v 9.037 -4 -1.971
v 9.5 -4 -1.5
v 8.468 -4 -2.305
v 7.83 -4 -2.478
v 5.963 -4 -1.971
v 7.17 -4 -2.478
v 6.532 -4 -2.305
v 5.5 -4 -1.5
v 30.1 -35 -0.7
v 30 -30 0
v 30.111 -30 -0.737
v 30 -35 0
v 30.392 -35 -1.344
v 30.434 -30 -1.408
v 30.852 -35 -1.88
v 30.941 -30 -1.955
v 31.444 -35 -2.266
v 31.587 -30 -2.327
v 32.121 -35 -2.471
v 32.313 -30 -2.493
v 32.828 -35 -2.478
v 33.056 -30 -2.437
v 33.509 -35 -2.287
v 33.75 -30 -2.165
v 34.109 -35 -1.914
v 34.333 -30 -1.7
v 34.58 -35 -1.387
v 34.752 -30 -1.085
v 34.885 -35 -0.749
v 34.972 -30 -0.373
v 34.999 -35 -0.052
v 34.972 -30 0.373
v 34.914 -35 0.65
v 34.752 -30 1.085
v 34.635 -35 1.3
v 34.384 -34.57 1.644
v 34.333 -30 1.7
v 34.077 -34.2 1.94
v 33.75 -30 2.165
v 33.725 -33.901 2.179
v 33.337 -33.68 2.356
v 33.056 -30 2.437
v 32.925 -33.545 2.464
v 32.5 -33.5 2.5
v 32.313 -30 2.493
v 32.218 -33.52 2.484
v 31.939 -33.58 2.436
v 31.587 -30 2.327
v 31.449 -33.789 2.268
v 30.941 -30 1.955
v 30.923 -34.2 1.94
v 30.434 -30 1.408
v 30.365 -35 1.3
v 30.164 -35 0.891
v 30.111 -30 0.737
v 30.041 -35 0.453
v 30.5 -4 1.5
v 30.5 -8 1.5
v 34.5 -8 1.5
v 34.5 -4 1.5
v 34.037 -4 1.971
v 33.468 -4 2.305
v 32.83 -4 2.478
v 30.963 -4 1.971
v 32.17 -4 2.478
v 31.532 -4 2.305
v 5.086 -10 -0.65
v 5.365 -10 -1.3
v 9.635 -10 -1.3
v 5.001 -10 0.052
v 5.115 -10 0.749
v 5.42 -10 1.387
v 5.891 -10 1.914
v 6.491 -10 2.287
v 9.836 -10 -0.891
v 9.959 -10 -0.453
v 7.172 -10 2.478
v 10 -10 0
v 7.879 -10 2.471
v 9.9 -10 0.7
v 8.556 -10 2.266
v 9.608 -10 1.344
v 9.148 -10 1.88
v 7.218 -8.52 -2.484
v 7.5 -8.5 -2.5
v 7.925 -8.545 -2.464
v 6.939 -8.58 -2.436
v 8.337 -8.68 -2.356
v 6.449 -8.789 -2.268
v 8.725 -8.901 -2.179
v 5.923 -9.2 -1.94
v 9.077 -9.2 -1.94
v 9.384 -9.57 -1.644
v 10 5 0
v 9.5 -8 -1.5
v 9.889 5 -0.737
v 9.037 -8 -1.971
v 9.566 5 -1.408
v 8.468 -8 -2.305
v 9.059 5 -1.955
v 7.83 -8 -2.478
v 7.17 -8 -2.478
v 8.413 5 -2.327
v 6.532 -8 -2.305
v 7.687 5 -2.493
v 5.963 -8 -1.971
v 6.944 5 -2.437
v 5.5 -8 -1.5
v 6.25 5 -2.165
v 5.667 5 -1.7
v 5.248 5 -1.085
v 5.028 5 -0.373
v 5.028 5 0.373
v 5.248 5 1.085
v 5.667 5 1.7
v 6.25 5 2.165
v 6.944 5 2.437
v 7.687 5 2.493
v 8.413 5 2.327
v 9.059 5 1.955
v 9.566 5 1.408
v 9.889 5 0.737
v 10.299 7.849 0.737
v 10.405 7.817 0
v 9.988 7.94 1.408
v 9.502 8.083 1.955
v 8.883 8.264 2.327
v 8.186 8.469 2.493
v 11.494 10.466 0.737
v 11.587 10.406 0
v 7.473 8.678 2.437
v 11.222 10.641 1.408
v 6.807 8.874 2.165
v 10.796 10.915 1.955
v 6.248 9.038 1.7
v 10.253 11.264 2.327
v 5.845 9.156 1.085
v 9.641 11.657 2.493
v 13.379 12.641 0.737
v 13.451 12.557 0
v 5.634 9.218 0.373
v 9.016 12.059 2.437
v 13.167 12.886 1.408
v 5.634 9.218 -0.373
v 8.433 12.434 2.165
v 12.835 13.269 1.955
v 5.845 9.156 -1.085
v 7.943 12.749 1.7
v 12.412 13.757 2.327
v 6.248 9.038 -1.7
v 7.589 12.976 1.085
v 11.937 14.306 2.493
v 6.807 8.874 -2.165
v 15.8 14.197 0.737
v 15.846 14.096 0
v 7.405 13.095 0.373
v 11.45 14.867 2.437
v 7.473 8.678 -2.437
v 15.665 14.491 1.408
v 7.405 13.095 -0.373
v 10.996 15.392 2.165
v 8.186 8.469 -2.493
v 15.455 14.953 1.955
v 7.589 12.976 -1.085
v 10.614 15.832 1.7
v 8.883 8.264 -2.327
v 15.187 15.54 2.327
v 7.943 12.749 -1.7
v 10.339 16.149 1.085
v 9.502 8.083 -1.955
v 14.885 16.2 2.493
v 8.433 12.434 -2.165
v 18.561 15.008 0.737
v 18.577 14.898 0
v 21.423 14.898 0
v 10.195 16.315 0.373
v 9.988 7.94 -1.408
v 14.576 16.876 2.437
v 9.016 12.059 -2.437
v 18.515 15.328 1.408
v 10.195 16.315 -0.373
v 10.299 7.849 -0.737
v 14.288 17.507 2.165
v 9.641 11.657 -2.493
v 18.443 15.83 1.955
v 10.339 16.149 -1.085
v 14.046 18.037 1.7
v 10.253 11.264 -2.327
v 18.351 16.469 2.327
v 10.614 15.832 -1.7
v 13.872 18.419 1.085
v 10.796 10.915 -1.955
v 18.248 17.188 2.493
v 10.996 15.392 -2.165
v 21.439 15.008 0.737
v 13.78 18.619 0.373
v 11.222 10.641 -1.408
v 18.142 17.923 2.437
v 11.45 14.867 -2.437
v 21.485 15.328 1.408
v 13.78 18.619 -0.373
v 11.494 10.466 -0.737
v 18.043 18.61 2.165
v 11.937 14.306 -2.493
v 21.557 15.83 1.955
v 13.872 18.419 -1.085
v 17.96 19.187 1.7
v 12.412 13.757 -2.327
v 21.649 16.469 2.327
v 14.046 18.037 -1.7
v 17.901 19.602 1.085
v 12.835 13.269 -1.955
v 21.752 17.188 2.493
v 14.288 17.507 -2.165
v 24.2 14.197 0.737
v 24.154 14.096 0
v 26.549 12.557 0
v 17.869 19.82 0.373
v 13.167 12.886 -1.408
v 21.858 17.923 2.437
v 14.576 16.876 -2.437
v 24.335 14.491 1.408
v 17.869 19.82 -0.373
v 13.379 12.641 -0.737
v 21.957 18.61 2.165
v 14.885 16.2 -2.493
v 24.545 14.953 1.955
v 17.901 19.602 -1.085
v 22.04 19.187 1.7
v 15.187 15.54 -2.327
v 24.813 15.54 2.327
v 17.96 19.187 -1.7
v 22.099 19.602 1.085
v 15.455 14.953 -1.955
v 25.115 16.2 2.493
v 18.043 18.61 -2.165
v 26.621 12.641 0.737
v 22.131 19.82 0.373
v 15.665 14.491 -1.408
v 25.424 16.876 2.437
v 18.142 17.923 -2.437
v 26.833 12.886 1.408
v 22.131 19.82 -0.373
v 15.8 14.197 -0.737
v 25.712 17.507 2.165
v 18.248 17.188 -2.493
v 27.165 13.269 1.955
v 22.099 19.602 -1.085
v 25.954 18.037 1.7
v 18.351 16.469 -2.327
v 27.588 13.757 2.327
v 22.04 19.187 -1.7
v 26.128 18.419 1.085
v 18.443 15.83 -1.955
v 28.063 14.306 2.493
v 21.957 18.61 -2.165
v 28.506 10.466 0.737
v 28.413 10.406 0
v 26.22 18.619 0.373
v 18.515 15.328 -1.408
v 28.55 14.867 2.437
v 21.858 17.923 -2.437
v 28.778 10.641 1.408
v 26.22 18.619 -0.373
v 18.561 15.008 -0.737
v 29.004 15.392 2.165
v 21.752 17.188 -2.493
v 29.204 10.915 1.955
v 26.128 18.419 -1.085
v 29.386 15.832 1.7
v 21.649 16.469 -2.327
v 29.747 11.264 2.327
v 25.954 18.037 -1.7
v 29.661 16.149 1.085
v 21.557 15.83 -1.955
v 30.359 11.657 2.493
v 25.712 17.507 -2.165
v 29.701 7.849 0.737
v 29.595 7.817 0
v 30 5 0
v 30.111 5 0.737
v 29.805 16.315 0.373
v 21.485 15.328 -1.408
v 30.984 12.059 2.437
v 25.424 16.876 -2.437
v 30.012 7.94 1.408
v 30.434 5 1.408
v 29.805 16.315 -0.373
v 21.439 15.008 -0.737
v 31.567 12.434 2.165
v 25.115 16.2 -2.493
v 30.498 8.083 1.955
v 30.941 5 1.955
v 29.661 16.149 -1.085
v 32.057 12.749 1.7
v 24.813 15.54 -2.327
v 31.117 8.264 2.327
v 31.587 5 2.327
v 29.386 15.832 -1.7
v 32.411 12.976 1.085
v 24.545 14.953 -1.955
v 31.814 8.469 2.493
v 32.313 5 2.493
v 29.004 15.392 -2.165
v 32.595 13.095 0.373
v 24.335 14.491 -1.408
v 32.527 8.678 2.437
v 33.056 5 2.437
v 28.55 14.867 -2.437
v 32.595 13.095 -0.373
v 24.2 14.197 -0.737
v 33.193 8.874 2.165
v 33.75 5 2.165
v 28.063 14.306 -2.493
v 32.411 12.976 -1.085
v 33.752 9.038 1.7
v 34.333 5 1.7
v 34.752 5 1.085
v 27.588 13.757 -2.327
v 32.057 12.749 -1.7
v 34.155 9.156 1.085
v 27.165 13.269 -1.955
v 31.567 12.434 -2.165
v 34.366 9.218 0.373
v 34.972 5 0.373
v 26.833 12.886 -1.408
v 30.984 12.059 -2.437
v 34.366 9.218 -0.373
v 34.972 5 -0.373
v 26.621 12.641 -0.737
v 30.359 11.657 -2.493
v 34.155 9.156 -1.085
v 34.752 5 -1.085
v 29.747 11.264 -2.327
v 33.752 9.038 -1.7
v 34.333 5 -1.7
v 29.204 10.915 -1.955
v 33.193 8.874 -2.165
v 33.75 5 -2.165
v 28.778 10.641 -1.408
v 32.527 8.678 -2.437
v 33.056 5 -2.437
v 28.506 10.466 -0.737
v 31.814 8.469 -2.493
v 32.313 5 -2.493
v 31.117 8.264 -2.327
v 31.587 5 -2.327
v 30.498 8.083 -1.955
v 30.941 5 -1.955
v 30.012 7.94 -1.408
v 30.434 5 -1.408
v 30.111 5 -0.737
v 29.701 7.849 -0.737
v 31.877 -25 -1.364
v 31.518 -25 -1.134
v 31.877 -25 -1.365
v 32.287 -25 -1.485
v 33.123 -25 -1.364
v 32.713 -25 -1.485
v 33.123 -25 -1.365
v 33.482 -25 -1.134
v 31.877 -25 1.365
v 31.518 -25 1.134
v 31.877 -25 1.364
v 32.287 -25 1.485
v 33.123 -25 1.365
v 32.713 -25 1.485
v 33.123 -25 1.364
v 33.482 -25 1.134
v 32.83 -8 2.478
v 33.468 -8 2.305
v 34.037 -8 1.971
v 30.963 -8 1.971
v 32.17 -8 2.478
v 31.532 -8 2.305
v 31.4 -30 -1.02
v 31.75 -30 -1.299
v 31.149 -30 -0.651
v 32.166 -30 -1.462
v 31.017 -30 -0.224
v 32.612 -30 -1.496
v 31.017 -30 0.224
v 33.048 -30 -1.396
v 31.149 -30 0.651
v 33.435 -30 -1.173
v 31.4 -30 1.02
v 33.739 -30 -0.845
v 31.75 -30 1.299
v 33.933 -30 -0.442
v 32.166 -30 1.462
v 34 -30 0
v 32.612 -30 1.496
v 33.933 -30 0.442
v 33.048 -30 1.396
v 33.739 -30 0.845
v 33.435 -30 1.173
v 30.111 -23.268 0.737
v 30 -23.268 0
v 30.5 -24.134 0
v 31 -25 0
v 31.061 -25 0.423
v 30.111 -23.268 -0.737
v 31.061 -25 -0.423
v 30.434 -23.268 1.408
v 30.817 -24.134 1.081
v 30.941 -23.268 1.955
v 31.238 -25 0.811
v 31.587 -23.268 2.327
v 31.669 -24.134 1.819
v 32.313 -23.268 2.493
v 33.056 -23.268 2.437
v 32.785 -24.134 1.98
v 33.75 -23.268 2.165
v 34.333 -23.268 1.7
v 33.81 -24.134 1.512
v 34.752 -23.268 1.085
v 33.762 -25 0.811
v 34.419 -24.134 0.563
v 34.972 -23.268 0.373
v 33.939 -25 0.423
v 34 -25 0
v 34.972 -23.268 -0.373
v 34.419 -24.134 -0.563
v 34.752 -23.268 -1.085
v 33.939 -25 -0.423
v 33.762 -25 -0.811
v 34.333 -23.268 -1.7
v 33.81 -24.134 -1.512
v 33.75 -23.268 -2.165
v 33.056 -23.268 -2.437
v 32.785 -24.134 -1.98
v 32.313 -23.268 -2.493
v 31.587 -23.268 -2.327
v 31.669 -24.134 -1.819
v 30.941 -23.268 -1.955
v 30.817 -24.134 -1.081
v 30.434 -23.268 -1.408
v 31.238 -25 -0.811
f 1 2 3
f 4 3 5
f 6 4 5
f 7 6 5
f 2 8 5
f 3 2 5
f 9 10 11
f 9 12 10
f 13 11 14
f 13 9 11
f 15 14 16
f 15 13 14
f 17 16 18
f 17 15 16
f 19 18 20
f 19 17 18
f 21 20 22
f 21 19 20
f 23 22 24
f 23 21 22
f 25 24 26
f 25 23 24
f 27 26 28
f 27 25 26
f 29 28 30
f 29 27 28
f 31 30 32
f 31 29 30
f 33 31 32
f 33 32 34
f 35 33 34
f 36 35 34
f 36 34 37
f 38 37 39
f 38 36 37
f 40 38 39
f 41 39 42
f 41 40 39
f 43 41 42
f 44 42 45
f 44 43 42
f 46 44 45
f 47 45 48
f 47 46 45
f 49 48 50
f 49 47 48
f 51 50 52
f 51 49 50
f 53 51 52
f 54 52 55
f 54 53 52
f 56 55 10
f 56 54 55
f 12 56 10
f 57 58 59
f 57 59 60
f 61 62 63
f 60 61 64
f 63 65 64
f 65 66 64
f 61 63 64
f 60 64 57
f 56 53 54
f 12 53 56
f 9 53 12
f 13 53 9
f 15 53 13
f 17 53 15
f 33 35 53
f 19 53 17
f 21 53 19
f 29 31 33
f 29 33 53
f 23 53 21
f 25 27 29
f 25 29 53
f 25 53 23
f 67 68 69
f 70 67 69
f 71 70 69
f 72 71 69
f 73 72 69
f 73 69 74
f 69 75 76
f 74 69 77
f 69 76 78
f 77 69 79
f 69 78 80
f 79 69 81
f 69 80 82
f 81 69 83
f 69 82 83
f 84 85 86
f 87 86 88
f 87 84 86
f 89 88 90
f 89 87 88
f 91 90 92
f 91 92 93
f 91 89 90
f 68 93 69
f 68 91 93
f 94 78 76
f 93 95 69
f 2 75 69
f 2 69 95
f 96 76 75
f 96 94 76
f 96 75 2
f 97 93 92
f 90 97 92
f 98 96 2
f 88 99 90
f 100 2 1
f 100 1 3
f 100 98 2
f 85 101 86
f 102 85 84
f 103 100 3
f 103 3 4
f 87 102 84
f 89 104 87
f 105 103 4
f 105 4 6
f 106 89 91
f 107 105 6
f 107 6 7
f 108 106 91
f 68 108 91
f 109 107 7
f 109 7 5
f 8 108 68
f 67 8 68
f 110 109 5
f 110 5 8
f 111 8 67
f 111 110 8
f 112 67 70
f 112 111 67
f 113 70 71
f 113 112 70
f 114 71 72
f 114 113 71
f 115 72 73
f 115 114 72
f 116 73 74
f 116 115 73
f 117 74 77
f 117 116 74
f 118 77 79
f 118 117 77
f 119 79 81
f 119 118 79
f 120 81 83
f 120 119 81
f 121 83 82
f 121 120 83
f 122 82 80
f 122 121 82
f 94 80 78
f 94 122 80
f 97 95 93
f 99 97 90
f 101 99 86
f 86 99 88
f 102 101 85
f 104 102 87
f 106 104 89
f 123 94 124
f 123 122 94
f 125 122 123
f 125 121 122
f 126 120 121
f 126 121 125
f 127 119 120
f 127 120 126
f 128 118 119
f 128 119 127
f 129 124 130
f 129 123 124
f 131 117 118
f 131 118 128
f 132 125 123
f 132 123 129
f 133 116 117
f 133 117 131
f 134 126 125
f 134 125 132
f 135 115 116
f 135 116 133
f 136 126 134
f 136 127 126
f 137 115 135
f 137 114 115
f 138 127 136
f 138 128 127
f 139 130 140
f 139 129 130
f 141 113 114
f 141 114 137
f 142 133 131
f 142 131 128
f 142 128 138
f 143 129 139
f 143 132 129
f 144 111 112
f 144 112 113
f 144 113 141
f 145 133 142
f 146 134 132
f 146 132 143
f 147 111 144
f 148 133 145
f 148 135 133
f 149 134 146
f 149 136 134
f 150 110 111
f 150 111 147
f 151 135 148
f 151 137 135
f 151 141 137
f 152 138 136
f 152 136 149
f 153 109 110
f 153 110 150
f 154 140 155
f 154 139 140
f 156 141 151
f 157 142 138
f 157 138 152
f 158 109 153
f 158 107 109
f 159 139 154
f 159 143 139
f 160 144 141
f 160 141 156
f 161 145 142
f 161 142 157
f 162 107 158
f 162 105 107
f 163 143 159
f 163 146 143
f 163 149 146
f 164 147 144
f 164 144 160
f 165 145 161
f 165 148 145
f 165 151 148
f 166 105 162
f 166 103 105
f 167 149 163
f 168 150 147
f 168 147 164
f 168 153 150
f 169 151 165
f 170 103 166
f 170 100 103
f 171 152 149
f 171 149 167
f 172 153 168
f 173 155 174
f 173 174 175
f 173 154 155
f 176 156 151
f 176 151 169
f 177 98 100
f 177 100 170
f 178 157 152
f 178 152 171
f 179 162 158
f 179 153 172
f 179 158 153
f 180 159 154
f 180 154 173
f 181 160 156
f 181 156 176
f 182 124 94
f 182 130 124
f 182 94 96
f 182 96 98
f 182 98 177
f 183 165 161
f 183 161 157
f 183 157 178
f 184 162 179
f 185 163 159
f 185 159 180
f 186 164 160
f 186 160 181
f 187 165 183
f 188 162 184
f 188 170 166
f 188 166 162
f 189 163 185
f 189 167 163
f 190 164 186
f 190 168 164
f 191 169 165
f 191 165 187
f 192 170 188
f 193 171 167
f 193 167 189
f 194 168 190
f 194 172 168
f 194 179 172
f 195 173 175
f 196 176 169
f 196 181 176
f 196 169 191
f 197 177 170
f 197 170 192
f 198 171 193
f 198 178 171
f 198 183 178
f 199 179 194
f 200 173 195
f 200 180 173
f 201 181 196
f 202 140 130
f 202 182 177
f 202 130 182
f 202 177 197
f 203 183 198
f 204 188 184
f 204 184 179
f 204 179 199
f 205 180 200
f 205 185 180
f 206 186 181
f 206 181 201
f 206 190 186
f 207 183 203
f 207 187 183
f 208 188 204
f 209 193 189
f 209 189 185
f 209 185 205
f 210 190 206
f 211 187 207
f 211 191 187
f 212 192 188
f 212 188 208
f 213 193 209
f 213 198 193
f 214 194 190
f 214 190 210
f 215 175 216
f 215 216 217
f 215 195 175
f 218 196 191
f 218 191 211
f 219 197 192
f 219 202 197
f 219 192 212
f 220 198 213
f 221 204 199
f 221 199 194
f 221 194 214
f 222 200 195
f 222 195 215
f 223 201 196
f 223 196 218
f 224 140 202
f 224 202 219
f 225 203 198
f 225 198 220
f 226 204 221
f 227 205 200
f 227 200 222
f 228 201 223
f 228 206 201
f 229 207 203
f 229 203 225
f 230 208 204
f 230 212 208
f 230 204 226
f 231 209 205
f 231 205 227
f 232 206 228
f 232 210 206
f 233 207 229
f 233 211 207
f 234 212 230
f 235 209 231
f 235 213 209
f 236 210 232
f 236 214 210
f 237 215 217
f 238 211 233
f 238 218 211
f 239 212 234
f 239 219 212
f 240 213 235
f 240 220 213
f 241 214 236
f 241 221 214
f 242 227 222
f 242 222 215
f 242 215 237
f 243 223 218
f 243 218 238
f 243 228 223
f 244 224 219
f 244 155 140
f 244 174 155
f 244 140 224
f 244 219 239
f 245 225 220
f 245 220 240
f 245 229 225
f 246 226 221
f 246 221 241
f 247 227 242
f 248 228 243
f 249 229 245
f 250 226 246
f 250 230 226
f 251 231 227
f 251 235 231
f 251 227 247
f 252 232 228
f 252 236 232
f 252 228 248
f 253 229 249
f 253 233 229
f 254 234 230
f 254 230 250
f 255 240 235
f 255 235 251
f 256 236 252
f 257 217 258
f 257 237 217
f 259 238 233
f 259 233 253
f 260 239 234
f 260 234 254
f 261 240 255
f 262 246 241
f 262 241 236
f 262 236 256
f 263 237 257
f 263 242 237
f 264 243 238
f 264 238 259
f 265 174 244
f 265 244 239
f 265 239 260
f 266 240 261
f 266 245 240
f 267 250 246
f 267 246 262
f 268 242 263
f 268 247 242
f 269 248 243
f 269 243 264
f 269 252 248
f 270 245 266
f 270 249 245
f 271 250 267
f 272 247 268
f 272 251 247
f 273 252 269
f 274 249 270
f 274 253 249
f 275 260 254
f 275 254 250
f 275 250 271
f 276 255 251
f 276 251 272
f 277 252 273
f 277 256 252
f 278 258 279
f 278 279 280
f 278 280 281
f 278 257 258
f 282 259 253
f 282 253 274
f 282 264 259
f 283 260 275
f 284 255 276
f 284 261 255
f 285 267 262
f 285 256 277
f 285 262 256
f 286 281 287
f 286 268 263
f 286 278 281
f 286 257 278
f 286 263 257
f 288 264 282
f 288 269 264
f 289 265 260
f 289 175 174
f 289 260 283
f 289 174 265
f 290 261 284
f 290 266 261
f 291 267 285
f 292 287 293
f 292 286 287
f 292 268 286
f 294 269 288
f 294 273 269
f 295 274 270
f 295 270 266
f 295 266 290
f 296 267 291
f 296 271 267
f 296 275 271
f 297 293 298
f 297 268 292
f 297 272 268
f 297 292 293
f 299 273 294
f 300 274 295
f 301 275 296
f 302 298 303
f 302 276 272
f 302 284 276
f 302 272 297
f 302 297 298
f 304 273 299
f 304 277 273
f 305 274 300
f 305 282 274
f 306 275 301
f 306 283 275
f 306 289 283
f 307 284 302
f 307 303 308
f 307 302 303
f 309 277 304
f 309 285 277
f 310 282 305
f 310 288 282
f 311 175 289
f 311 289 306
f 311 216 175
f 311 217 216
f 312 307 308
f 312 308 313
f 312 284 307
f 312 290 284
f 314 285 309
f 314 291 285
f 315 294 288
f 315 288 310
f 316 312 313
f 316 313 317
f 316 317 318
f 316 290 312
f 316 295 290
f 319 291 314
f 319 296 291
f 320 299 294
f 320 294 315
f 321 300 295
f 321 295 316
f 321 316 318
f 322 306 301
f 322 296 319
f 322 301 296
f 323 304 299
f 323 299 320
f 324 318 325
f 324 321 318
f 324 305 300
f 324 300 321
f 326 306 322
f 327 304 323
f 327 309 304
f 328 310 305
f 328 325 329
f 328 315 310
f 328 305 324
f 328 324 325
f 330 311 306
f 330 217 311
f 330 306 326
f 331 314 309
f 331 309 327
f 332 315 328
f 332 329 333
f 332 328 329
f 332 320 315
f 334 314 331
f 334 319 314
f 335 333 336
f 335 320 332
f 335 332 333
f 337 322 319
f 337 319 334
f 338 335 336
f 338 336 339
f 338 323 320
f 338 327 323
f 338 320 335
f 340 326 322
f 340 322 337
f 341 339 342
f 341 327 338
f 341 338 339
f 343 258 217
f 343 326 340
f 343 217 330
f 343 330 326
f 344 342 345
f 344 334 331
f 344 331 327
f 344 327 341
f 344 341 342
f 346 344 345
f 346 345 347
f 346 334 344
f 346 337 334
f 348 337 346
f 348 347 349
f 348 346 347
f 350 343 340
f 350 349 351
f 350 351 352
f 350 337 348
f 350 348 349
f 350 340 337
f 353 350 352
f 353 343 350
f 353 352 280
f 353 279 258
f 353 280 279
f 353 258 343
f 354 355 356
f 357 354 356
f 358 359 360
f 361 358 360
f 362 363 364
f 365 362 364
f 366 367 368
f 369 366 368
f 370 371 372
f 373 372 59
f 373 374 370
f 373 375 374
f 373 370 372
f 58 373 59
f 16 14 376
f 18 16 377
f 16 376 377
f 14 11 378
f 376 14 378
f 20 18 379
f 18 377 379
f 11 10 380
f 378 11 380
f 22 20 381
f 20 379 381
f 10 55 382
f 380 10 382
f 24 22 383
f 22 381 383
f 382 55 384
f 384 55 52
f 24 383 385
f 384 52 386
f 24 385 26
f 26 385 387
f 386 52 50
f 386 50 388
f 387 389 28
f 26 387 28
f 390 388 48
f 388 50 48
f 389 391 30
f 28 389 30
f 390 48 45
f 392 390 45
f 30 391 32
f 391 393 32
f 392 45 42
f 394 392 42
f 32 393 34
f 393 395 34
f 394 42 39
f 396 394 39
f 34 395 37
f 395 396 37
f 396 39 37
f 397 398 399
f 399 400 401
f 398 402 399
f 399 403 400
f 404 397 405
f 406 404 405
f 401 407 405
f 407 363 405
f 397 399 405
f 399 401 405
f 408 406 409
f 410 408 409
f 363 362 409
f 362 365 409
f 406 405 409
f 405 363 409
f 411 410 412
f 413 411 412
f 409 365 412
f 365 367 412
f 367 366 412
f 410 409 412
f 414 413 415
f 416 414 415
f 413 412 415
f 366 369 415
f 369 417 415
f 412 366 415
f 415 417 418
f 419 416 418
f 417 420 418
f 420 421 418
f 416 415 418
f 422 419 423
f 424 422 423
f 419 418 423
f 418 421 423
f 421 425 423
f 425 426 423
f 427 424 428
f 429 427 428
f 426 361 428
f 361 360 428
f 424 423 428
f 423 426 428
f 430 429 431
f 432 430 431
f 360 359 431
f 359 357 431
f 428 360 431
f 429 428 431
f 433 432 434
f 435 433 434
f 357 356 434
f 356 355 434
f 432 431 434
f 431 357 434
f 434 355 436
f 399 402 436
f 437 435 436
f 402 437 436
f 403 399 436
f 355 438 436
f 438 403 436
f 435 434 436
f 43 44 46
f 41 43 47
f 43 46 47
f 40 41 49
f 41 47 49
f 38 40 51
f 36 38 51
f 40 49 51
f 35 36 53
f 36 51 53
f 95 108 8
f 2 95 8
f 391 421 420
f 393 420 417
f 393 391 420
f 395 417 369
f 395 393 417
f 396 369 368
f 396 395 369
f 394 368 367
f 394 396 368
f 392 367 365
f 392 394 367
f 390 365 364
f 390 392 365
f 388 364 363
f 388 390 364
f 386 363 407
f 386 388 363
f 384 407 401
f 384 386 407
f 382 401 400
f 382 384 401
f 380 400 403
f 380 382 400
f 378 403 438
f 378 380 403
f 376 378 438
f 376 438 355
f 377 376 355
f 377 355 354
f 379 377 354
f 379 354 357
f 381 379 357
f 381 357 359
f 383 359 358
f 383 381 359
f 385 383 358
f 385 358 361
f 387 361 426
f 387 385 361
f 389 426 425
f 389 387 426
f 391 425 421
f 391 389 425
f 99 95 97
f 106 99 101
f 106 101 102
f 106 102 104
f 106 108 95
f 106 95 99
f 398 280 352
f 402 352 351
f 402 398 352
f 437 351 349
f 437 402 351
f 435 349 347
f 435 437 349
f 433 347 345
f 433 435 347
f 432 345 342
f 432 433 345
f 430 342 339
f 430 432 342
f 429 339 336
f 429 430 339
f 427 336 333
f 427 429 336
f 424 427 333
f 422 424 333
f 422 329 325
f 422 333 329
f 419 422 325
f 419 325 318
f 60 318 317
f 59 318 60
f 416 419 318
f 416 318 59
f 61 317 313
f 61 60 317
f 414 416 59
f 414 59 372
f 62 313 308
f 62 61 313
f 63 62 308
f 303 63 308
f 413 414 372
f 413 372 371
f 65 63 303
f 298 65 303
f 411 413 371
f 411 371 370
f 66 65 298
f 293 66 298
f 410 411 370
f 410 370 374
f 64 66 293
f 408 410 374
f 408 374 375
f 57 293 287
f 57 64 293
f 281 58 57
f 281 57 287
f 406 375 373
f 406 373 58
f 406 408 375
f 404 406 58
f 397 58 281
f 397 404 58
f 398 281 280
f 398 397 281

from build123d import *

# Parameters (mm, degrees)
SKETCH_3_R          = 2.5
SKETCH_4_W          = 7.512886461
SKETCH_4_H          = 4
CUT_EXTRUDE_1_DEPTH = 10
CUT_EXTRUDE_START   = 10
SKETCH_4_3_W        = 9.374325773
SKETCH_4_3_H        = 4
CUT_EXTRUDE_2_DEPTH = 40.56056908
CUT_EXTRUDE_START_2 = -5
SKETCH_5_R          = 2.5
SKETCH_5_R_2        = 1.5
CUT_EXTRUDE_3_DEPTH = 5
CHAMFER_1_SIZE2     = 1
CHAMFER_1_SIZE      = 1.732050808


with BuildPart() as part:
    # 스윕1: sweep along a path in 스케치2
    with BuildLine(Plane.XY) as sweep_1_path:
        Line((7.5, -10), (7.5, 5))
        ThreePointArc((7.5, 5), (20, 17.5), (32.5, 5))
        Line((32.5, 5), (32.5, -35))
    # 스케치3 → 스윕1 (sweep)
    with BuildSketch(Plane(origin=(0, 0, 0), x_dir=(1, 0, 0), z_dir=(0, 1, 0))):
        with Locations((7.5, 0)):
            Circle(SKETCH_3_R)
    sweep(path=sweep_1_path.line)

    # 스케치4 → 컷-돌출1 (cut)
    with BuildSketch(Plane(origin=(0, 0, 0), x_dir=(0, 0, -1), z_dir=(1, 0, 0))):
        with Locations((5.256443231, -6)):
            Rectangle(SKETCH_4_W, SKETCH_4_H)
        Polygon((2.5, -10), (2.5, -8.5), (1.3, -10), align=None)
    extrude(amount=CUT_EXTRUDE_1_DEPTH, mode=Mode.SUBTRACT)

    # 스케치4<3> → 컷-돌출2 (cut, through all)
    with BuildSketch(Plane(origin=(0, 0, 0), x_dir=(0, 0, -1), z_dir=(1, 0, 0)).offset(CUT_EXTRUDE_START)):
        with Locations((-6.187162887, -6)):
            Rectangle(SKETCH_4_3_W, SKETCH_4_3_H)
        Polygon((-1.3, -35), (-2.5, -35), (-2.5, -33.5), align=None)
    extrude(amount=CUT_EXTRUDE_2_DEPTH, mode=Mode.SUBTRACT)

    # 스케치5 → 컷-돌출3 (cut)
    with BuildSketch(Plane.XZ.offset(35).offset(CUT_EXTRUDE_START_2)):
        with Locations((32.5, 0)):
            Circle(SKETCH_5_R)
        with Locations((32.5, 0)):
            Circle(SKETCH_5_R_2, mode=Mode.SUBTRACT)
    extrude(amount=-CUT_EXTRUDE_3_DEPTH, mode=Mode.SUBTRACT)

    # 모따기1
    chamfer_1_edges = [part.edges().sort_by_distance(p)[0] for p in [
        (35, -25, 0),
    ]]
    chamfer_1_side = [part.faces().sort_by_distance(p)[0] for p in [
        (35, -24.98, 0),
    ]]
    chamfer(chamfer_1_edges, length=CHAMFER_1_SIZE - 0.0001, length2=CHAMFER_1_SIZE2 - 0.0001, reference=chamfer_1_side[0])  # a hair under: the kernel refuses the full size


solid = part.part
